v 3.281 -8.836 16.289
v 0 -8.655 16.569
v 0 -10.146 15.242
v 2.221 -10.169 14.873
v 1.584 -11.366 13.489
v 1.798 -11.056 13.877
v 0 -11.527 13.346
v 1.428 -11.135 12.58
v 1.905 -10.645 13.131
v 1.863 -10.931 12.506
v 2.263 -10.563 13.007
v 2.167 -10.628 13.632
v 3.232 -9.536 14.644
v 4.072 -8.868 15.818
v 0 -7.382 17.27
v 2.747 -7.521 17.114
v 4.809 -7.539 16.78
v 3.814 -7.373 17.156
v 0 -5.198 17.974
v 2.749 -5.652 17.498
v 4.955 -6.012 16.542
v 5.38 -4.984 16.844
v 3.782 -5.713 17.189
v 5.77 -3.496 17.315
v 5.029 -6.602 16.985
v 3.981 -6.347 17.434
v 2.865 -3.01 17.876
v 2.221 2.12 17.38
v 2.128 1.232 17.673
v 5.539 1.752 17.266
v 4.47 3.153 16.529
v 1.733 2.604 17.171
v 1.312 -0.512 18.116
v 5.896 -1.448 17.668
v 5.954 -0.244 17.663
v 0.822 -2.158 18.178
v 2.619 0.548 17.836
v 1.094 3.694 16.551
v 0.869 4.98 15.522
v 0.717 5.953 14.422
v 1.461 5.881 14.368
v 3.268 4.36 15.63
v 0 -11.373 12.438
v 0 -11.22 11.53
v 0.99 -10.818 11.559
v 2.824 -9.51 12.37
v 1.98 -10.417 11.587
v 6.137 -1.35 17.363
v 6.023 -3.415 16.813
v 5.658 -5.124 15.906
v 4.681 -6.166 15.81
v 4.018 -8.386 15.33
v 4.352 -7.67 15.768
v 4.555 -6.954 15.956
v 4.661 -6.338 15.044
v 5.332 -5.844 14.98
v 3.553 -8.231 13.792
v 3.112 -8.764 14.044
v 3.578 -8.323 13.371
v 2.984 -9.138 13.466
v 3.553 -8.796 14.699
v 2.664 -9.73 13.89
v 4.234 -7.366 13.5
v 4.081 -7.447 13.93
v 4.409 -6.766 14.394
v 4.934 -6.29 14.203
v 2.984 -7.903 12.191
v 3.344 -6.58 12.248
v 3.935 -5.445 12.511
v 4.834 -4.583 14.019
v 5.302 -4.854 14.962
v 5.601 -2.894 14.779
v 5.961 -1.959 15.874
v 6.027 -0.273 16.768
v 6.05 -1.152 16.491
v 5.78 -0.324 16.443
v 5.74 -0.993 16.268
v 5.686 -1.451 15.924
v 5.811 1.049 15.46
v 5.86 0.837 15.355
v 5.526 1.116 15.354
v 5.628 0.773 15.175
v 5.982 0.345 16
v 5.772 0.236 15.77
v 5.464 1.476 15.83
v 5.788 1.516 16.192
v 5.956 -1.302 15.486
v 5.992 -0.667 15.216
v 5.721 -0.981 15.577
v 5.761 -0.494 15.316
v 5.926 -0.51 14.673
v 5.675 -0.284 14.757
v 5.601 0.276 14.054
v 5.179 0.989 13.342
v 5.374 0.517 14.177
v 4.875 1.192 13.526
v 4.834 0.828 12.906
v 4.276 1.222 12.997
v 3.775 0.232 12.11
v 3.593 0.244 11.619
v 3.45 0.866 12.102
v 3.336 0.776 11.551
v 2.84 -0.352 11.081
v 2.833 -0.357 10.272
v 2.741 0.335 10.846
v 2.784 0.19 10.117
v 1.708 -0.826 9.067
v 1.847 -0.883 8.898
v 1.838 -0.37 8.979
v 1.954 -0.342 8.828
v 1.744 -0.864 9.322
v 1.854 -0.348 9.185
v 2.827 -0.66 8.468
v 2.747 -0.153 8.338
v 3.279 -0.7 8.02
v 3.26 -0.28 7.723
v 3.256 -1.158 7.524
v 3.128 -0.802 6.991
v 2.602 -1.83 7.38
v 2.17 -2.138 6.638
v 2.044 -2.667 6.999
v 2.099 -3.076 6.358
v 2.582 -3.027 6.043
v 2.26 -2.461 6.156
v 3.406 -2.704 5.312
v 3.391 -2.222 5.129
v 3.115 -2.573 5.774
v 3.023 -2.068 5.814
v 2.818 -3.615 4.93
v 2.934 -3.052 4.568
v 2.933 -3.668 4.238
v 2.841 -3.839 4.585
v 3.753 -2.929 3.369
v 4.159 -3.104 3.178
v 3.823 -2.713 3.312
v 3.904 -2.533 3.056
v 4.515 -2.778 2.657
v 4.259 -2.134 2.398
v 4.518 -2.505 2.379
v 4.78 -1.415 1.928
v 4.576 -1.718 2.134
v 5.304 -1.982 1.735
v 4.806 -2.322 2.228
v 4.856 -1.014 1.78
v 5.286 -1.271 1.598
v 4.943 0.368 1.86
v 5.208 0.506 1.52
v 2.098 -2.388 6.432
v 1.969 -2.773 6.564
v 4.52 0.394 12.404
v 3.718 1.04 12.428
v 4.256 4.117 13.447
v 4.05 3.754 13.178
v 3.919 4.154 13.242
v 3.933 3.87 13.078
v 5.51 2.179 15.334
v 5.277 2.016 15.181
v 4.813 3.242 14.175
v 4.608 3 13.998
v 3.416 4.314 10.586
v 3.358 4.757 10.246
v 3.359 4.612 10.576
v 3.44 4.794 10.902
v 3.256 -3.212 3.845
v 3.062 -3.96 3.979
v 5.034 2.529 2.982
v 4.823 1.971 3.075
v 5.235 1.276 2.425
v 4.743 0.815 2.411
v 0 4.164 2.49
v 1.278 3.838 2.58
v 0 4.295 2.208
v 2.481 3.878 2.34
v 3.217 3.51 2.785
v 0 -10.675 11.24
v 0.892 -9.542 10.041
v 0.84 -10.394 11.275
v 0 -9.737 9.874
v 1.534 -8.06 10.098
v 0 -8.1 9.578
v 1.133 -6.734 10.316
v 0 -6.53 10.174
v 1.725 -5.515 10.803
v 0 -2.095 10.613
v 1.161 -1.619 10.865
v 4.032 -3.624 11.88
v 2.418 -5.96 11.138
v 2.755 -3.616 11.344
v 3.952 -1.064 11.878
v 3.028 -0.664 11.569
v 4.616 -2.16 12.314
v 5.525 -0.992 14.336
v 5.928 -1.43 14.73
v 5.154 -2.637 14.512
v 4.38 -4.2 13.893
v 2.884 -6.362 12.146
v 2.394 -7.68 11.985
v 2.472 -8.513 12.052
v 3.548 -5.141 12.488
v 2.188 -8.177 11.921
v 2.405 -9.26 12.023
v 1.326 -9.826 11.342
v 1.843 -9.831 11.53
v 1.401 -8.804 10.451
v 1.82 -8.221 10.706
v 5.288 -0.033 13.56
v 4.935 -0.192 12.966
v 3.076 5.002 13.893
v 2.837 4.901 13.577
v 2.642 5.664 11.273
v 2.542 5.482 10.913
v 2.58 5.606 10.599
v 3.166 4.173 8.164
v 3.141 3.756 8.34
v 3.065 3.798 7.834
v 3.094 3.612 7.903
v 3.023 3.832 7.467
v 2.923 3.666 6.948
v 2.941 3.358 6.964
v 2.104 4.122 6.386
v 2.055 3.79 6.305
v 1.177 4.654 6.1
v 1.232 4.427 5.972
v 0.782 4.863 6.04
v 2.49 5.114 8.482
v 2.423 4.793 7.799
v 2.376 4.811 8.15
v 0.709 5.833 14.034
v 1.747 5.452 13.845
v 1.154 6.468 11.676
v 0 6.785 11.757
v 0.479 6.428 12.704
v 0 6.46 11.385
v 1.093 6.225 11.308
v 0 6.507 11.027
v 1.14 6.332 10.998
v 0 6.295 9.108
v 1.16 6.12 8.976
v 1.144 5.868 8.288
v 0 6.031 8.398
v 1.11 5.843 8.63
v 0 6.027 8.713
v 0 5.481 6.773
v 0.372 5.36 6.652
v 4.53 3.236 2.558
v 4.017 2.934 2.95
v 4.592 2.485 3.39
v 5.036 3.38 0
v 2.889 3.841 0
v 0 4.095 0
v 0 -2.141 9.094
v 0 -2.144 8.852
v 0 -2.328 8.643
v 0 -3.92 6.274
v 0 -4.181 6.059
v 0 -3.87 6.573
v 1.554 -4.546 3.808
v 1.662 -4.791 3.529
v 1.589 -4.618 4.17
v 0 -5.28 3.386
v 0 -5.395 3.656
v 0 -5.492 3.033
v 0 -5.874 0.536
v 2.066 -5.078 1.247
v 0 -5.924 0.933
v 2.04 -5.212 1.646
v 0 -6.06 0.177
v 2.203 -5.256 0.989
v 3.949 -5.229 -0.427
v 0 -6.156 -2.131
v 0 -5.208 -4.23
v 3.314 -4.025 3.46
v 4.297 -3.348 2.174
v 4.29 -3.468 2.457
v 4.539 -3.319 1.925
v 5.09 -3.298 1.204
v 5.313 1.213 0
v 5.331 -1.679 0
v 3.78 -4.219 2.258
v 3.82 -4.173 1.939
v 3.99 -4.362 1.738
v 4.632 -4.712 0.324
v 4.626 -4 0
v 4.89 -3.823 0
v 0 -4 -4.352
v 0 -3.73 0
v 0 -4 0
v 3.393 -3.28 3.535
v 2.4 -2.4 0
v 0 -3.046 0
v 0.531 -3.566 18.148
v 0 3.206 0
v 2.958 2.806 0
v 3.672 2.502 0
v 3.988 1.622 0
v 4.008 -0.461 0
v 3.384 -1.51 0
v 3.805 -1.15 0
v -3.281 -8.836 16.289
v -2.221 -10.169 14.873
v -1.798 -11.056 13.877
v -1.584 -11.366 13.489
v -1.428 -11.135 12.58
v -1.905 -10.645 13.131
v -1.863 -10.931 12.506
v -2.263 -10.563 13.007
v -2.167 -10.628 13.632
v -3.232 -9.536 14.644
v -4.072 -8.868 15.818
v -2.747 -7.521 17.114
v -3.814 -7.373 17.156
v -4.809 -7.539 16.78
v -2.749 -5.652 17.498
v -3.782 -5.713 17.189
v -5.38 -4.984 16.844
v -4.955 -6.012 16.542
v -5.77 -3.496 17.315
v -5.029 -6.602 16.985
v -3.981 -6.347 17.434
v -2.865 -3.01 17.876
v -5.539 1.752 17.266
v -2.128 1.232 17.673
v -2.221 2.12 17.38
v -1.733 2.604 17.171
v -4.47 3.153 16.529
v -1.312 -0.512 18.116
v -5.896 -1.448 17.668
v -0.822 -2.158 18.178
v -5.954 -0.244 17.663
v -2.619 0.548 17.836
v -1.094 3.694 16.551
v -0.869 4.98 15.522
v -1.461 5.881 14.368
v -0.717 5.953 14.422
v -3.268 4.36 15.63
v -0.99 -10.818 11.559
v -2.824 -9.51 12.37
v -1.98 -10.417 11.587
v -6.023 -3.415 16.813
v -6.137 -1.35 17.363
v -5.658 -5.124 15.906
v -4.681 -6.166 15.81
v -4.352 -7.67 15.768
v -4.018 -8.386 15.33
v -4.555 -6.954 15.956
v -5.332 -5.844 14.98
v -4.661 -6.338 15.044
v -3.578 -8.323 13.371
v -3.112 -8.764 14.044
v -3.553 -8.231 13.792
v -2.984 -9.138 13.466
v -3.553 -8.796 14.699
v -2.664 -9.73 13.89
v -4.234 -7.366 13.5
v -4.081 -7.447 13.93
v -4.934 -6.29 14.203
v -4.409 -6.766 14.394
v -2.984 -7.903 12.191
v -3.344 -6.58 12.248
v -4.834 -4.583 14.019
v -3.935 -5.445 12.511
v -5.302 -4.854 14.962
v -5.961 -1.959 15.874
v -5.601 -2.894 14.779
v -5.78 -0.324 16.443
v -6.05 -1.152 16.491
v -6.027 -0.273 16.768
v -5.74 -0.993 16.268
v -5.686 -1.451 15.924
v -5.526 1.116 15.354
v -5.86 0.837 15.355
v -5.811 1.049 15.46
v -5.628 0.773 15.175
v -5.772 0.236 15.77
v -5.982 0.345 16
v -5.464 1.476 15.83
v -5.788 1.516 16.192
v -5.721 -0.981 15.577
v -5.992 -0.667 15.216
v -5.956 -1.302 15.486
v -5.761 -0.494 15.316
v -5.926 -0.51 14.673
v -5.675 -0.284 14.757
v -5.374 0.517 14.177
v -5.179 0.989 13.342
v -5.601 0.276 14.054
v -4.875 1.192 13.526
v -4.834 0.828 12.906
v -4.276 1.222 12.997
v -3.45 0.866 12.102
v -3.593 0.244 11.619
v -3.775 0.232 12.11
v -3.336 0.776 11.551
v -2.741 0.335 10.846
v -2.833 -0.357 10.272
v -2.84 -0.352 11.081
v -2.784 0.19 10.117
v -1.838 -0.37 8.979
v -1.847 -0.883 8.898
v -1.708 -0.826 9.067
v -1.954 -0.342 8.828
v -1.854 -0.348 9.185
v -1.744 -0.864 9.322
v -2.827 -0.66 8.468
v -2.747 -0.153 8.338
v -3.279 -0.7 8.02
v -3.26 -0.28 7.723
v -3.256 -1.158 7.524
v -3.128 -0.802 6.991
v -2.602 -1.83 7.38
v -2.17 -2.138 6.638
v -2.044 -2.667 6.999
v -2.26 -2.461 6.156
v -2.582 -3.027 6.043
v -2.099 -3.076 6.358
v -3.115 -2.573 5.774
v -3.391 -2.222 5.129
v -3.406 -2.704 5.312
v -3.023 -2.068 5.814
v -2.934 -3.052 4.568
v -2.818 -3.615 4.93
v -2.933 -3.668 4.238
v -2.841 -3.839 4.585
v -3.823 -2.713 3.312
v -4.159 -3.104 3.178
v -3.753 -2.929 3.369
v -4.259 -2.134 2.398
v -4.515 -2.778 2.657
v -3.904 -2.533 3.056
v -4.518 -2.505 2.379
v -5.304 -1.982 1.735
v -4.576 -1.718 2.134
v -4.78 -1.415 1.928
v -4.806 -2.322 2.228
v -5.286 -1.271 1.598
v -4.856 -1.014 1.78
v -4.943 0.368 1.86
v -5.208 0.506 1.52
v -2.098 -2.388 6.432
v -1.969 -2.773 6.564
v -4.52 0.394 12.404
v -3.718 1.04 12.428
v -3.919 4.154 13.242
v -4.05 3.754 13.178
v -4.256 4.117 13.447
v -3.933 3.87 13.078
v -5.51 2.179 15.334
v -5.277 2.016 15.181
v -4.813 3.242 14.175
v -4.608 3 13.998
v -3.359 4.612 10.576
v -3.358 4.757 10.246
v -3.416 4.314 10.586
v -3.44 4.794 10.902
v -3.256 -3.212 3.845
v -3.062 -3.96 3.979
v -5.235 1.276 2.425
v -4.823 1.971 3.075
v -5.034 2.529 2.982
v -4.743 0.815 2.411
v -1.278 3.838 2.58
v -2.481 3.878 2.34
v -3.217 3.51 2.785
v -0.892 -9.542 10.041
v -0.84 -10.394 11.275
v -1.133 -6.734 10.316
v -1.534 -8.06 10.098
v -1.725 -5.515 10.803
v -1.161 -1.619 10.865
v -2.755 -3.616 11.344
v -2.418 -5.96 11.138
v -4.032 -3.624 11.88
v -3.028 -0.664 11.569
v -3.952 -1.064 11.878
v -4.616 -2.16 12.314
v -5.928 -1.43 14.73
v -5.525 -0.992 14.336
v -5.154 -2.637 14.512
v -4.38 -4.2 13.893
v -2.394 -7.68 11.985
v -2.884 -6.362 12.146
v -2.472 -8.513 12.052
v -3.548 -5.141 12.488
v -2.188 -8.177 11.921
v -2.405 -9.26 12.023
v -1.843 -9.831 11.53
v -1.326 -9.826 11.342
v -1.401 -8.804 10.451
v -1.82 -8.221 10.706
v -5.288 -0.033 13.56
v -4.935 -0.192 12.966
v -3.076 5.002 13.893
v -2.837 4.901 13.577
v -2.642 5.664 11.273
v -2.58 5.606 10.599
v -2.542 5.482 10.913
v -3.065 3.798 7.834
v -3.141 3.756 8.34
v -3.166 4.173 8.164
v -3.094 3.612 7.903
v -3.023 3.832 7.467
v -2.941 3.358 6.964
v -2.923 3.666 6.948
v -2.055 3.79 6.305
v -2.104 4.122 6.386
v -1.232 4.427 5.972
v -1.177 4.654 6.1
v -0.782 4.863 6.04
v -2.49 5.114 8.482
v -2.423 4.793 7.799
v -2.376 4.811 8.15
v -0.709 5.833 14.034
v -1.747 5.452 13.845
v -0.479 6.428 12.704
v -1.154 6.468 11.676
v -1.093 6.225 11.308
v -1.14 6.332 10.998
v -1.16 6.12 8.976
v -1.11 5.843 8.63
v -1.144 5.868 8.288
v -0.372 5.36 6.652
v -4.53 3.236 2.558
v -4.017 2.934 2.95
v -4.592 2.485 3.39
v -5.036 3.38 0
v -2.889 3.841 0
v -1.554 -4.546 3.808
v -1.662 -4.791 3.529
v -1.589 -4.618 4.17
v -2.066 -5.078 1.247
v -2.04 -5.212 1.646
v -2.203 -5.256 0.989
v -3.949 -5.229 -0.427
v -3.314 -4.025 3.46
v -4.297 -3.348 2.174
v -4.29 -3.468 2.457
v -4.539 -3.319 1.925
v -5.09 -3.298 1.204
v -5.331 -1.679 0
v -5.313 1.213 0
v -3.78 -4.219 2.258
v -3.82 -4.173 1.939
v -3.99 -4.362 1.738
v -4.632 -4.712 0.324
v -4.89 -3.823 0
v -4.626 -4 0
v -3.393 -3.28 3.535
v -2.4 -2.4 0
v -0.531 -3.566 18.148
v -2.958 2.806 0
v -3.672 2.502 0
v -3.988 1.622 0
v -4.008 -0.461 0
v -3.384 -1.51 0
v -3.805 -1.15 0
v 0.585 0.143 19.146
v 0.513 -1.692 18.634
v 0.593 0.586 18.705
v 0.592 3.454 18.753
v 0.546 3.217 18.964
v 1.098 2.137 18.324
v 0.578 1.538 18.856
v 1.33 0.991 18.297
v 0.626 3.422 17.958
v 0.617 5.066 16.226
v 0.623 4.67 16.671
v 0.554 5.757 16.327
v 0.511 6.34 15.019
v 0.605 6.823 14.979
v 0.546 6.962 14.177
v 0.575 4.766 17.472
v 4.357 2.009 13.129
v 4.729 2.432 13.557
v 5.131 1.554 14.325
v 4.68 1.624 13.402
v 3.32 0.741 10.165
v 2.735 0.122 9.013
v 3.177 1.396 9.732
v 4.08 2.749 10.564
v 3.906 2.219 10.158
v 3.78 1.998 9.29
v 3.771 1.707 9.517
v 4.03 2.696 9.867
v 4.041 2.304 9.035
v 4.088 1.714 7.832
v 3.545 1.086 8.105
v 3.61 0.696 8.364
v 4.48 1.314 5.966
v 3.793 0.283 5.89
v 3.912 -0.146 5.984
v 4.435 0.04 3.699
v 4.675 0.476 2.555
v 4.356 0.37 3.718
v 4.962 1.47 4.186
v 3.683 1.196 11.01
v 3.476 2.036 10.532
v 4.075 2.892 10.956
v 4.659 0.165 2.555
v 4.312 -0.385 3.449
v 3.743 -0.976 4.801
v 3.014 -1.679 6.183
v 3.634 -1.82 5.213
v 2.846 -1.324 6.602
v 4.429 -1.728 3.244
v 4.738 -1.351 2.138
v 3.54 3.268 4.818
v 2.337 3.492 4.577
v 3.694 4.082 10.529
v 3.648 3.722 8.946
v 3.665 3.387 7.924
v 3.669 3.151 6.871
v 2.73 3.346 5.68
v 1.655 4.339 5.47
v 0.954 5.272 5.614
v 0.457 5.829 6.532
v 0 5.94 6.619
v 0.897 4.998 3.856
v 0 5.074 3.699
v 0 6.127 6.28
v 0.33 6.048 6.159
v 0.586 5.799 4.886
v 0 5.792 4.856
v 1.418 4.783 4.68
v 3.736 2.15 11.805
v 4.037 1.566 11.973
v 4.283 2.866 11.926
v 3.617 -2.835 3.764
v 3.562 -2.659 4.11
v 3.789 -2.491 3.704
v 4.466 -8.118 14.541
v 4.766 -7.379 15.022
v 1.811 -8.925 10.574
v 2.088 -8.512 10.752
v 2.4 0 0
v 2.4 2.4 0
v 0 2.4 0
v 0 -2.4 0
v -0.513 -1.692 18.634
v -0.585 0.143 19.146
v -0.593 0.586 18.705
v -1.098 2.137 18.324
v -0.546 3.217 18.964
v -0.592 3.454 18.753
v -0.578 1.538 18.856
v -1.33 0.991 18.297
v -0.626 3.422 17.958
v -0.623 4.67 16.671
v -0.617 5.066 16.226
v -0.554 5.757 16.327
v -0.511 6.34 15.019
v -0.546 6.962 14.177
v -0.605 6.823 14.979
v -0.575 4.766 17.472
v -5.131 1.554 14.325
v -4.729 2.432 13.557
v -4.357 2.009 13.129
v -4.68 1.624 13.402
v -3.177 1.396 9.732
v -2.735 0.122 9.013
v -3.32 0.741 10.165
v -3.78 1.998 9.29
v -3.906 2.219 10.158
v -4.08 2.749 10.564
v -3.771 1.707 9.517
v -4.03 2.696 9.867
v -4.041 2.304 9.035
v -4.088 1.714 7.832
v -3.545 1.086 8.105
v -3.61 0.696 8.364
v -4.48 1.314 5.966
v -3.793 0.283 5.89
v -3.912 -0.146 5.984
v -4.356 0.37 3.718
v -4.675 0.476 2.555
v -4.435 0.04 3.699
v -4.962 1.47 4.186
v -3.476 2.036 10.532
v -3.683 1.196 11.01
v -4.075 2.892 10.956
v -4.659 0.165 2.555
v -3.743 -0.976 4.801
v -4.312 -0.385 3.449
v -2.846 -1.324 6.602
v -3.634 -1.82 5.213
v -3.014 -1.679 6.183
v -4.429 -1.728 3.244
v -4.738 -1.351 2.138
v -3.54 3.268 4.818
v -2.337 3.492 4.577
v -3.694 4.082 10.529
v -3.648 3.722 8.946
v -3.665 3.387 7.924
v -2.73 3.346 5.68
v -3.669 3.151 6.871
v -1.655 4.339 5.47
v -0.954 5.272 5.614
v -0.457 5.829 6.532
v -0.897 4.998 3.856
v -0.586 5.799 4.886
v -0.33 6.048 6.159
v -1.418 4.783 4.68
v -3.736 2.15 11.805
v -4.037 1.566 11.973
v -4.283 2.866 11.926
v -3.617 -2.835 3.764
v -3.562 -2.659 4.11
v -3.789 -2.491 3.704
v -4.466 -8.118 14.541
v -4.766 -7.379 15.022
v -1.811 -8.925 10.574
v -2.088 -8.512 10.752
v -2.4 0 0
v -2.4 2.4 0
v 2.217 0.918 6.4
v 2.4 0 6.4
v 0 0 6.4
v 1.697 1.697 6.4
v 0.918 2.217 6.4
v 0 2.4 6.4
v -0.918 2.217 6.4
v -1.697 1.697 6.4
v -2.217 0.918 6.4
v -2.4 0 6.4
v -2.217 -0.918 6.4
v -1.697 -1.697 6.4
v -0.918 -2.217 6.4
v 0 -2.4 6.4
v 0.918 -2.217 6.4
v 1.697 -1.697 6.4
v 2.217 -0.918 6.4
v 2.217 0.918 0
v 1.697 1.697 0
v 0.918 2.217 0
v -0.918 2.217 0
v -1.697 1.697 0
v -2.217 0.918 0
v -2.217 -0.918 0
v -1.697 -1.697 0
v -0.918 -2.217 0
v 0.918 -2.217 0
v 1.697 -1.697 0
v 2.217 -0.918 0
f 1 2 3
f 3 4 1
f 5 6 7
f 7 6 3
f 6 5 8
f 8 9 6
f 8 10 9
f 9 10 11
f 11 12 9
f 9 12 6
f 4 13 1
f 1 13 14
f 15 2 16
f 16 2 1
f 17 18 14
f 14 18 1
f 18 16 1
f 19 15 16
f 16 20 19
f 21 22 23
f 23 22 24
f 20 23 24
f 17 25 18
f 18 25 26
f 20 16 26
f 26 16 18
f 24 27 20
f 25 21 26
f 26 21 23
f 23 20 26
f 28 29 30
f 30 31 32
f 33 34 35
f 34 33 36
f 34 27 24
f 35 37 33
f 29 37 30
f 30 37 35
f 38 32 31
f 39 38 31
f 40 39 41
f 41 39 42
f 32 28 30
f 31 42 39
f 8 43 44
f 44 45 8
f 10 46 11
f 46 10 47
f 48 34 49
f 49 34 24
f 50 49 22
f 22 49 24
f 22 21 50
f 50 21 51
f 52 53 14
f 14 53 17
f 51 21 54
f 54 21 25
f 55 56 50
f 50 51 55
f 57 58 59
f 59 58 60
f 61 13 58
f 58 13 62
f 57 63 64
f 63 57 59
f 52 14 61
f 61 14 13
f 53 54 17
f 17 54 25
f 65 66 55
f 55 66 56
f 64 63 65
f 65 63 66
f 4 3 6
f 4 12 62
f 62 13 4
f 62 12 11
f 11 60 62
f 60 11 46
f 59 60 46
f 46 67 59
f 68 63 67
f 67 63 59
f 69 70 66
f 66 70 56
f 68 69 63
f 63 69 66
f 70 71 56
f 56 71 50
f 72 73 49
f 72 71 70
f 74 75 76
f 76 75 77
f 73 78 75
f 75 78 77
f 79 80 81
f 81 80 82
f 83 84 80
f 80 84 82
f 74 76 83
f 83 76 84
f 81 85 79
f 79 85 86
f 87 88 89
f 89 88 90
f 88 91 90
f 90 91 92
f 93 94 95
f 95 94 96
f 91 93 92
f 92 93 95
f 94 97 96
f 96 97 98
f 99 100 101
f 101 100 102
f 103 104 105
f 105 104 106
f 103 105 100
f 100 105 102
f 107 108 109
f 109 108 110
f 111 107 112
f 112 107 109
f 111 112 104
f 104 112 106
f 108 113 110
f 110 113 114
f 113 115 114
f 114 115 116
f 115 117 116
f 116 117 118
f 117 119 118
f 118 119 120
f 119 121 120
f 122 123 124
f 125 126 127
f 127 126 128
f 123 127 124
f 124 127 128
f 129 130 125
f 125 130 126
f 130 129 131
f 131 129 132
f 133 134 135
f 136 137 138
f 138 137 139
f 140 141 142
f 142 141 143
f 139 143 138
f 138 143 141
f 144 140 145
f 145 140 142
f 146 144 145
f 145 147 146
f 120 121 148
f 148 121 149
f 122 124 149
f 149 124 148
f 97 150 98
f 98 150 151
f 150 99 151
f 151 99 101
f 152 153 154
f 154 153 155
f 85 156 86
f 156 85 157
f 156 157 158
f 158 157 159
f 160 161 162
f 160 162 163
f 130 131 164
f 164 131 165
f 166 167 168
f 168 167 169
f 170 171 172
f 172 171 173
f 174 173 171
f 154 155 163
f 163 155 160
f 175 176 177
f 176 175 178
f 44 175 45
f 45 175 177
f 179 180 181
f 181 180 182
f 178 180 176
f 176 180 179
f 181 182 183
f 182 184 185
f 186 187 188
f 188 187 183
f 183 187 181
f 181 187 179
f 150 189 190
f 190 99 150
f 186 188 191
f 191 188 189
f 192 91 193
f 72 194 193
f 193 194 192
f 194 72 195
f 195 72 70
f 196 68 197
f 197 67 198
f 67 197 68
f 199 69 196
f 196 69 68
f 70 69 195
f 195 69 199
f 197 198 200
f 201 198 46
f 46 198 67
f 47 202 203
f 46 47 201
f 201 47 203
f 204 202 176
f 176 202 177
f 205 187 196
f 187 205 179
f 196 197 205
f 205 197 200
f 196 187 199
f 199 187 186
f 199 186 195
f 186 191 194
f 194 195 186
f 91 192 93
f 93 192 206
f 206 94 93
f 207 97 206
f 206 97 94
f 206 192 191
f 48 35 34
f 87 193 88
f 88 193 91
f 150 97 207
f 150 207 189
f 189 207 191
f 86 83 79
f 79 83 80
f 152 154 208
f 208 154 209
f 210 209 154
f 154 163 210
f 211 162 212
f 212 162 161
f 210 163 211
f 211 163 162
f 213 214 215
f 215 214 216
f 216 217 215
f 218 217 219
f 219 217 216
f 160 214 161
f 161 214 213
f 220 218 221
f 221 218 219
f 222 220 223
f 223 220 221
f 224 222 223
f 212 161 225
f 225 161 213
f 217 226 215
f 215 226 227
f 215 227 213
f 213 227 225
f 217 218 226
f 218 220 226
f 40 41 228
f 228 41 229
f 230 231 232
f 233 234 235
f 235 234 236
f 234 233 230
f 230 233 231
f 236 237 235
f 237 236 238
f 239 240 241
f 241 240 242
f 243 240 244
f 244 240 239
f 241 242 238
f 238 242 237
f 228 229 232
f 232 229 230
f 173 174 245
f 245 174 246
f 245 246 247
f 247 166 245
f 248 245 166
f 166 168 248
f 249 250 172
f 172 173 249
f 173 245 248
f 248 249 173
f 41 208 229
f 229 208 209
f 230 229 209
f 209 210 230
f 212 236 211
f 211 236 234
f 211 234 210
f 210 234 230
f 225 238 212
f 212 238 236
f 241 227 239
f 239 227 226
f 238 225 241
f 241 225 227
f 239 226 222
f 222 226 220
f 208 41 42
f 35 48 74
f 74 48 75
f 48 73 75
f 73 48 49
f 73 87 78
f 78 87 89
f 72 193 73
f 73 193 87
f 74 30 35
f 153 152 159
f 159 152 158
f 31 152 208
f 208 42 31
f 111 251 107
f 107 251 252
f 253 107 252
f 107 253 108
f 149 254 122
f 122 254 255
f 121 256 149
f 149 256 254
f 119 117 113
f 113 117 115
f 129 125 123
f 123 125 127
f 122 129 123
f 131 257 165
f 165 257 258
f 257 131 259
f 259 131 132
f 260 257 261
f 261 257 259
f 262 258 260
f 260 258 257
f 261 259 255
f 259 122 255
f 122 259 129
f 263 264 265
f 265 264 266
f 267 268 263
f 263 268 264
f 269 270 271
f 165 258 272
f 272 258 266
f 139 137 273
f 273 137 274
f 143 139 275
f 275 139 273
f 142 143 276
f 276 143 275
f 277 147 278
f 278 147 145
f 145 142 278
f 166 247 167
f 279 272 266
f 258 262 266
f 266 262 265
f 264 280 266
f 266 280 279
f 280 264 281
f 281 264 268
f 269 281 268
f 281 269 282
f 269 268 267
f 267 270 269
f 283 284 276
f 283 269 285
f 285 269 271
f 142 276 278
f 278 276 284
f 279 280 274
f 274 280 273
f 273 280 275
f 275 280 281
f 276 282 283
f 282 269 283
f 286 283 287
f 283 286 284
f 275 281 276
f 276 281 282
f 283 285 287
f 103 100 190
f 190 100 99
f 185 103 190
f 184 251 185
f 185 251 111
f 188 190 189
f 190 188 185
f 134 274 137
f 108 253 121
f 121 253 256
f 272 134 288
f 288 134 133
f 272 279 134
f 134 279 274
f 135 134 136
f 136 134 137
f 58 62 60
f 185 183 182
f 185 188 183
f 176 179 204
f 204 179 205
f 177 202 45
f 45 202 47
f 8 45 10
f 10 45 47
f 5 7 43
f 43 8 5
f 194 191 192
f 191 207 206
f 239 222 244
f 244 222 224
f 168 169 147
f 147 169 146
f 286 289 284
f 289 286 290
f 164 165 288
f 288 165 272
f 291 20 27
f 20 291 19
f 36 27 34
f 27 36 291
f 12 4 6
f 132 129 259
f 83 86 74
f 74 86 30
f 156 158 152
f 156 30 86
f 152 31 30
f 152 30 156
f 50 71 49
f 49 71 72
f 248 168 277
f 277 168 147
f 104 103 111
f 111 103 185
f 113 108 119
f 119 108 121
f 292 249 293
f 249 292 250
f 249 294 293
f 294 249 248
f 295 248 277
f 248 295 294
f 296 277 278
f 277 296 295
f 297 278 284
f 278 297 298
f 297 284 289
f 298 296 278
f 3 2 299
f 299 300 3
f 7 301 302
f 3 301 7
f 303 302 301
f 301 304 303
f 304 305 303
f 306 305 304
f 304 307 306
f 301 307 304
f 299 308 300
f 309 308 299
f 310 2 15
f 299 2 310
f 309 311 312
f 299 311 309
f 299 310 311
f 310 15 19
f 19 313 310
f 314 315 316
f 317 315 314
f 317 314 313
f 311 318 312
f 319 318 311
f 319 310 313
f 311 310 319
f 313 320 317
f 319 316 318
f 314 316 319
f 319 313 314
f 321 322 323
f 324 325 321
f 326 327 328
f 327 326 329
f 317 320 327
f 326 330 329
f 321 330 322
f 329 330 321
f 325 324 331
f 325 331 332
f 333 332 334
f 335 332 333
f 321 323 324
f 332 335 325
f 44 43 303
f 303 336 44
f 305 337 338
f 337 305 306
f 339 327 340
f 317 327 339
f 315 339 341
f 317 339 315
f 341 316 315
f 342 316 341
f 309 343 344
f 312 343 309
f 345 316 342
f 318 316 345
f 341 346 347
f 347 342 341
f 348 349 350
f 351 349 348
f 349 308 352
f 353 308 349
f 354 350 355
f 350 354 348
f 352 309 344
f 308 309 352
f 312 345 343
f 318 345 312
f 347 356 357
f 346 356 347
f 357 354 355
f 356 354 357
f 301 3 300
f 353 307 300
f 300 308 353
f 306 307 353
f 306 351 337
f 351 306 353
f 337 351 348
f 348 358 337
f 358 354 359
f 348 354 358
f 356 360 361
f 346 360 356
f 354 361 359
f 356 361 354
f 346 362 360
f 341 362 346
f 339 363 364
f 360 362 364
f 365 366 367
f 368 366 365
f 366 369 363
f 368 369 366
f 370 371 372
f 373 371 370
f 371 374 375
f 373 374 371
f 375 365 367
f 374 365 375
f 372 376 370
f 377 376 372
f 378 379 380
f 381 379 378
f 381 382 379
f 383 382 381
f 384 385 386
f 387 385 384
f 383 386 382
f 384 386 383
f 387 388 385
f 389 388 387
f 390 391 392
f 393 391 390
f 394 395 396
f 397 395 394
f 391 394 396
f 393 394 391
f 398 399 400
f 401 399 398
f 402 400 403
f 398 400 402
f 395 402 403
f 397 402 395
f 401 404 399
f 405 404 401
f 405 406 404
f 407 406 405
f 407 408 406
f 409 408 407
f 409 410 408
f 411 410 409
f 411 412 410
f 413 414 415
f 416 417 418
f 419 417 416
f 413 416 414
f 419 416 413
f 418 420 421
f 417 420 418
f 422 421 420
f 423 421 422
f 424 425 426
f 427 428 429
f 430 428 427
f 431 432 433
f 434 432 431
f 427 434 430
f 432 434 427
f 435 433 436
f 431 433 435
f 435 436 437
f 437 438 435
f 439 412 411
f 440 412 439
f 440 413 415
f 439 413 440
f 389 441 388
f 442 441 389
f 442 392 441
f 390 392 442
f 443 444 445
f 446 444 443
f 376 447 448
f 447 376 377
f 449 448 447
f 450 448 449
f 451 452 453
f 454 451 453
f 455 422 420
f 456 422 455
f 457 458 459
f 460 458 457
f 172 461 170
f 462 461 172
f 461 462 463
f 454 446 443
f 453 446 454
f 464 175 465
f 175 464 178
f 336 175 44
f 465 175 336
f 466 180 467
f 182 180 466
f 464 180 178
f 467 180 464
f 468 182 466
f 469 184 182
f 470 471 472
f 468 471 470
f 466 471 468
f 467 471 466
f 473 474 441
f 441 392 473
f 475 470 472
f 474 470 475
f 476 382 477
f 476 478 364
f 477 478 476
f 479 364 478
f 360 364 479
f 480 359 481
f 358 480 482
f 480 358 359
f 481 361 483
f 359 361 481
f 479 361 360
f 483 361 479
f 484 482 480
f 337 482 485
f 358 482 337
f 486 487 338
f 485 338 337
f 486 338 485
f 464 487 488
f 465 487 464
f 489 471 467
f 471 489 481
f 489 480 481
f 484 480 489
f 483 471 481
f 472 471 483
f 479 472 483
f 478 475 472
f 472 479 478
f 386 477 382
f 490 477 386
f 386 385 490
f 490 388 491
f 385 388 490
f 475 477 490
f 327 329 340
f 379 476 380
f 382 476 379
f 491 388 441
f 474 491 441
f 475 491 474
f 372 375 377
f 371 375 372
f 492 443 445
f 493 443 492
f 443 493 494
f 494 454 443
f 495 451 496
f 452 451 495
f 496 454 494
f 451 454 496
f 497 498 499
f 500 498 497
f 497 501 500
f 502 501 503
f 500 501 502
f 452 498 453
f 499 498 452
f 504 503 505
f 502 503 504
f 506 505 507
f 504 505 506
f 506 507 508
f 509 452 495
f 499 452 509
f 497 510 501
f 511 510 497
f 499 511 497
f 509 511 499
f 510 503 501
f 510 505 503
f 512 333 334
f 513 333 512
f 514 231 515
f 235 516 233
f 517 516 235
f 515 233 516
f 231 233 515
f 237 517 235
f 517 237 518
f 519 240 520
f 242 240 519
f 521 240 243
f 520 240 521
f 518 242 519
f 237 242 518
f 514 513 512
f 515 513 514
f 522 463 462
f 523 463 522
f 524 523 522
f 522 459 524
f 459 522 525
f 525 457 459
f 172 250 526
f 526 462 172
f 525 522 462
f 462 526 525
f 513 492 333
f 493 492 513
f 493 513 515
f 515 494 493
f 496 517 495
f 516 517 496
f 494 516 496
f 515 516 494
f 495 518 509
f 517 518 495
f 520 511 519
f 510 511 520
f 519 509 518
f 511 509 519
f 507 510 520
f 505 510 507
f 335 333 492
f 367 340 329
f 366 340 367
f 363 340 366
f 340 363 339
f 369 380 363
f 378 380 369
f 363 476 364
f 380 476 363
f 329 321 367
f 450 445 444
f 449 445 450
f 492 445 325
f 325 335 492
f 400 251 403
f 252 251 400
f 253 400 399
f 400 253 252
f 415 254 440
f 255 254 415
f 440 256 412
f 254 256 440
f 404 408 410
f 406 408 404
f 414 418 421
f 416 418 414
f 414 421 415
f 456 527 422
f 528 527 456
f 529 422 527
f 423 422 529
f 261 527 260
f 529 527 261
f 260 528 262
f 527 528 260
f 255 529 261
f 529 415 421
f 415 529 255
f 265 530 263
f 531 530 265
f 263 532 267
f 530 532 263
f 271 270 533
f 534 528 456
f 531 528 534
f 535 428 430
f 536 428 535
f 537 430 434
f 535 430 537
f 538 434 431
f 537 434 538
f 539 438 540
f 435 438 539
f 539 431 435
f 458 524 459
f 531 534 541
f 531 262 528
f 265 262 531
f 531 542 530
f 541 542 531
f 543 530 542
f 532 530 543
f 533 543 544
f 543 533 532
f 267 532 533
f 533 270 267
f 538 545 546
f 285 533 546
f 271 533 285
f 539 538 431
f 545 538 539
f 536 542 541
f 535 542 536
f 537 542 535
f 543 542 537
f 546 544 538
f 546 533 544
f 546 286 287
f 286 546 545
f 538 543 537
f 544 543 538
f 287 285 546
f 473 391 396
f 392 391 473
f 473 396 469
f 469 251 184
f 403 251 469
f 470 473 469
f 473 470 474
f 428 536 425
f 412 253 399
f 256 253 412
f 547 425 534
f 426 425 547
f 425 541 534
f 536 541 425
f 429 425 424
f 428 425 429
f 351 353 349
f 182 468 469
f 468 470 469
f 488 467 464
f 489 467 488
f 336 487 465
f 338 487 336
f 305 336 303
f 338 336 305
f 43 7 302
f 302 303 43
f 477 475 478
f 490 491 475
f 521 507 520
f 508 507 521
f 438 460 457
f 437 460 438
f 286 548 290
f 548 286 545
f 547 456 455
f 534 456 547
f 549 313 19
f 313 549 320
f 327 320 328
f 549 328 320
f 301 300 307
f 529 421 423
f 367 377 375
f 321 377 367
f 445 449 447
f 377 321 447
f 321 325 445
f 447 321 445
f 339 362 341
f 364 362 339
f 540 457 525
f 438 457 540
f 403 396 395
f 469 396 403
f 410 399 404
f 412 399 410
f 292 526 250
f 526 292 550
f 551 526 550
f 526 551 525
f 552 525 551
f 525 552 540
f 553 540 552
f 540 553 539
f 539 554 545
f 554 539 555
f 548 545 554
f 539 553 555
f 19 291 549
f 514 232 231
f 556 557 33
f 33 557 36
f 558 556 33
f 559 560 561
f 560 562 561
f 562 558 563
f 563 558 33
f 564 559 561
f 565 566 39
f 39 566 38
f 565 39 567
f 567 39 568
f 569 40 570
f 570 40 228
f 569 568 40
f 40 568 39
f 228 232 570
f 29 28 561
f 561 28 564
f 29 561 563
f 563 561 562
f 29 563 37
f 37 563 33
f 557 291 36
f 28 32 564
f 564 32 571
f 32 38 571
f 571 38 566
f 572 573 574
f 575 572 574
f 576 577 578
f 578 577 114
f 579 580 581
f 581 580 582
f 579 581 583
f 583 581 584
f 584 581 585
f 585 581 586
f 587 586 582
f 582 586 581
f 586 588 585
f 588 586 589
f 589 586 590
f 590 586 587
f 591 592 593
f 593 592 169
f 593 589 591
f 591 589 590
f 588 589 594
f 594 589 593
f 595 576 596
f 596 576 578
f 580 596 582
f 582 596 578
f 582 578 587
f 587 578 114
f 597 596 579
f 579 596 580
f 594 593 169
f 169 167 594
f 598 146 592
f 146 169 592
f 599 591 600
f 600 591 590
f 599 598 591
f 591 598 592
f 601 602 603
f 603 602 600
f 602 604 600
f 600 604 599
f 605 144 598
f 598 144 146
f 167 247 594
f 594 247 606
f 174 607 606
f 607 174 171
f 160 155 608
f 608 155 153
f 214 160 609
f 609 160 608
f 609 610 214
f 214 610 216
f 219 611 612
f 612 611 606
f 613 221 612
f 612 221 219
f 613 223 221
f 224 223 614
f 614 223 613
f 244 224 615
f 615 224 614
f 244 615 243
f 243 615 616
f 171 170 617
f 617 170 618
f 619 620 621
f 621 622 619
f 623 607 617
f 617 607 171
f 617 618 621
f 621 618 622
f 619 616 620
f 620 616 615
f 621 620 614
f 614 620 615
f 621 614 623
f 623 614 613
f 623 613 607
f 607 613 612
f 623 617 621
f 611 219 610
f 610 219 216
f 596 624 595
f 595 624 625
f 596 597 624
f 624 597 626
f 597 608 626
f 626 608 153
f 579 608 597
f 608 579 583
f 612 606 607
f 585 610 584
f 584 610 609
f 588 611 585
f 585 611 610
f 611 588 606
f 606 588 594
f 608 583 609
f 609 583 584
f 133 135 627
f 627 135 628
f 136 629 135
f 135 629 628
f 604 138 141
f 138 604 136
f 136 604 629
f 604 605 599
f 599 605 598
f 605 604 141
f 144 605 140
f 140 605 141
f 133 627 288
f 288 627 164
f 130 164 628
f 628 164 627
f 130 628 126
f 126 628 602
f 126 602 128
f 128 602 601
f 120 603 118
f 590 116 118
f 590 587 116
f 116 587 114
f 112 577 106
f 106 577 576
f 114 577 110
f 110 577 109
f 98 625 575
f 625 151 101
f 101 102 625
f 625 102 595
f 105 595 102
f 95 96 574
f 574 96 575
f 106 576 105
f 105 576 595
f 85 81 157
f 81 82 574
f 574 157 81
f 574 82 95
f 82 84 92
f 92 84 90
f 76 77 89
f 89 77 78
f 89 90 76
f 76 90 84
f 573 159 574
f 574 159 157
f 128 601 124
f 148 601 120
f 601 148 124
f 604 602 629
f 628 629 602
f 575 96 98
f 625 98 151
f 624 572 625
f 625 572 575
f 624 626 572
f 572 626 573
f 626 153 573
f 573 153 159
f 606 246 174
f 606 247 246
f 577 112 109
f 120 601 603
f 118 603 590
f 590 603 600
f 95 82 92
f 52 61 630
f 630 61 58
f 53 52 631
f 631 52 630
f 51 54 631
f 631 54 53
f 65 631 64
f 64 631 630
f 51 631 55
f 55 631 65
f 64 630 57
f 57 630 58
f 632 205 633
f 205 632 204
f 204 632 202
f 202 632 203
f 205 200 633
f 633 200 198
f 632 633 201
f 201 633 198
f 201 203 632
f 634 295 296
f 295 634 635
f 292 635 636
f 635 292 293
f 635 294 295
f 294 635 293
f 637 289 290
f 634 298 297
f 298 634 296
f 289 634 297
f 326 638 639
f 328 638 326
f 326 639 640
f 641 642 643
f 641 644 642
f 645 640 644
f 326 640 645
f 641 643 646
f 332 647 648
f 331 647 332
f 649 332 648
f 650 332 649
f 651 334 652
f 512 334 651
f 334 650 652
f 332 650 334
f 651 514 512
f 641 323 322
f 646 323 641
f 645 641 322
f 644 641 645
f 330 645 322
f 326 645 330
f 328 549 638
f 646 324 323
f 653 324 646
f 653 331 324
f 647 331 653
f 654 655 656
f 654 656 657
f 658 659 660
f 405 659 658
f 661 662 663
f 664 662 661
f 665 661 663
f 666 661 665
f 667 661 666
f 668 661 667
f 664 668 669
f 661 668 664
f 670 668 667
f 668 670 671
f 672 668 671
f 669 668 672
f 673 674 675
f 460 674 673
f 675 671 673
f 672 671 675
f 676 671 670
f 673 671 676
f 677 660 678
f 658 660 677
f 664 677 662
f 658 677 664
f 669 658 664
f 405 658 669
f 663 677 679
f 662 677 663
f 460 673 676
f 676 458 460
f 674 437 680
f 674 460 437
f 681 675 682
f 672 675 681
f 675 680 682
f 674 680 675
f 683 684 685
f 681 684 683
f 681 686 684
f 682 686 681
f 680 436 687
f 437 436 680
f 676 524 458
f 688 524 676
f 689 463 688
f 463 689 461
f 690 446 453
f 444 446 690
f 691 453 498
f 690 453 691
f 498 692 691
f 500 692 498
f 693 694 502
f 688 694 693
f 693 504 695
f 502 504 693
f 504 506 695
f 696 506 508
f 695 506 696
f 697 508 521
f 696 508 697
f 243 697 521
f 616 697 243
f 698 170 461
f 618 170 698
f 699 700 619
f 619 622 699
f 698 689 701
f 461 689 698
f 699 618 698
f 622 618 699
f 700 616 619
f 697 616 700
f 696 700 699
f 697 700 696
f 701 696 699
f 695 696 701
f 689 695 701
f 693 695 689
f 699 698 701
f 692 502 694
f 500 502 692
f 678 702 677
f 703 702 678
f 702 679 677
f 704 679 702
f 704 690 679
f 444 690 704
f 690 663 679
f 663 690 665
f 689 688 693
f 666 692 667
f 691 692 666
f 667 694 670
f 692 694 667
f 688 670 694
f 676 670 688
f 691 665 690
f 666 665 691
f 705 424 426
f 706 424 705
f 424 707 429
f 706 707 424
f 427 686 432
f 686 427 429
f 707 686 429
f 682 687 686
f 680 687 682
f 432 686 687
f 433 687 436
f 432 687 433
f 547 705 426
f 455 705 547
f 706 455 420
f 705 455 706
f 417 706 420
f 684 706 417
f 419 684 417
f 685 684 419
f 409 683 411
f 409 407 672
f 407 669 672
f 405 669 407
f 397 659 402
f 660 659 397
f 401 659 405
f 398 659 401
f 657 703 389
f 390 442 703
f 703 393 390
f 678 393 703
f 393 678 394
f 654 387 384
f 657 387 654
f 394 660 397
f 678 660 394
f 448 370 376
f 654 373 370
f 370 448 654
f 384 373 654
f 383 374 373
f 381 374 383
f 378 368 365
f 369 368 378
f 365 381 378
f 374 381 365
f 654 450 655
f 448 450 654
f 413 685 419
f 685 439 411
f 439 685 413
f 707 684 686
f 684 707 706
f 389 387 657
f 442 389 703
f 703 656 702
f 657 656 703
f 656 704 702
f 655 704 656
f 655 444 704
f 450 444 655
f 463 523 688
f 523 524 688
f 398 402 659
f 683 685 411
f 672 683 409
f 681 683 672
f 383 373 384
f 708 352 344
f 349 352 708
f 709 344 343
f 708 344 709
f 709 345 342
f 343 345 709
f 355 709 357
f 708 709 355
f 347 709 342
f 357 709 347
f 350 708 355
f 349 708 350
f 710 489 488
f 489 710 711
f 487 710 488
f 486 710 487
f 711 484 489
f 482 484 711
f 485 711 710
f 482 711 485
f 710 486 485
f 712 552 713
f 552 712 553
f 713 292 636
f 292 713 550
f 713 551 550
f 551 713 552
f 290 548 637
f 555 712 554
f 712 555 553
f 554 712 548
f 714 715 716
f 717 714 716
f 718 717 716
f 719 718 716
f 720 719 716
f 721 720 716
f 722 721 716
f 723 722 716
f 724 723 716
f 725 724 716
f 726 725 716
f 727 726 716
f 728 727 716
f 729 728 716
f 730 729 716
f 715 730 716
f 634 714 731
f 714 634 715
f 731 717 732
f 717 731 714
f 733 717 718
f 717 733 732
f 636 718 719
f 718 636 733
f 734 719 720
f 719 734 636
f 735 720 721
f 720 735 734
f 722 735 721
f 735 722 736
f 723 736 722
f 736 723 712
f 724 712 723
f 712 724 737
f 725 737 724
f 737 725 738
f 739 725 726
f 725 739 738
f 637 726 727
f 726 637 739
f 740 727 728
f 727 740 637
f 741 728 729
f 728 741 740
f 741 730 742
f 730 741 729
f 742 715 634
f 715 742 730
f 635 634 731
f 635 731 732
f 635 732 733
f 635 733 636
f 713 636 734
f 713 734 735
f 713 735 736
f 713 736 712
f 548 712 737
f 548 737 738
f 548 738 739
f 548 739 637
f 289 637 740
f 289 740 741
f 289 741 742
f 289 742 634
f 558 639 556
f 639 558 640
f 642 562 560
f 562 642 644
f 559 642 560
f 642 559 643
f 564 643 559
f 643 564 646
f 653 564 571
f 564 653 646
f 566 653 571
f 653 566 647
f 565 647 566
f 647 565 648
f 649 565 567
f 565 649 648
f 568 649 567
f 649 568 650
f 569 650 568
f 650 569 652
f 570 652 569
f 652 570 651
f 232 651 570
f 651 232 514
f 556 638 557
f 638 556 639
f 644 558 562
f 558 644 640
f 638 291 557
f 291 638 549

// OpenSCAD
use <../lib.scad>
use <s/49588s01.scad>
use <s/49588s03.scad>
function ldraw_lib__49588() = [
// 0 Minifig Head Snake with Closed Mouth
// 0 Name: 49588.dat
// 0 Author: Philippe Hurbain [Philo]
// 0 !LDRAW_ORG Part UPDATE 2023-04
// 0 !LICENSE Licensed under CC BY 4.0 : see CAreadme.txt
// 
// 0 BFC CERTIFY CCW
  [0,"BFC","CERTIFY"],
  [0,"BFC","CCW"],
// 
// 0 !KEYWORDS Ninjago
// 
// 0 !HISTORY 2021-04-28 {LEGO/Unity Microgame} Original part shape
// 0 !HISTORY 2022-07-04 [Philo] File preparation for LDraw Parts Tracker
// 0 !HISTORY 2023-08-25 [OrionP] Official Update 2023-04
// 
// 
// 1 16 0 0 0 1 0 0 0 1 0 0 0 1 s\49588s01.dat
  [1,16,0,0,0,1,0,0,0,1,0,0,0,1, ldraw_lib__s__49588s01()],
// 1 16 0 0 0 1 0 0 0 1 0 0 0 1 s\49588s03.dat
  [1,16,0,0,0,1,0,0,0,1,0,0,0,1, ldraw_lib__s__49588s03()],
];
module ldraw_lib__49588(step=0, col=false, unit=2/5, alt=false, line=0.2, solid=!$preview)
    makepoly(ldraw_lib__49588(), step=step, col=col, unit=unit, alt=alt, line=line, solid=solid);
ldraw_lib__49588(line=0.2);
